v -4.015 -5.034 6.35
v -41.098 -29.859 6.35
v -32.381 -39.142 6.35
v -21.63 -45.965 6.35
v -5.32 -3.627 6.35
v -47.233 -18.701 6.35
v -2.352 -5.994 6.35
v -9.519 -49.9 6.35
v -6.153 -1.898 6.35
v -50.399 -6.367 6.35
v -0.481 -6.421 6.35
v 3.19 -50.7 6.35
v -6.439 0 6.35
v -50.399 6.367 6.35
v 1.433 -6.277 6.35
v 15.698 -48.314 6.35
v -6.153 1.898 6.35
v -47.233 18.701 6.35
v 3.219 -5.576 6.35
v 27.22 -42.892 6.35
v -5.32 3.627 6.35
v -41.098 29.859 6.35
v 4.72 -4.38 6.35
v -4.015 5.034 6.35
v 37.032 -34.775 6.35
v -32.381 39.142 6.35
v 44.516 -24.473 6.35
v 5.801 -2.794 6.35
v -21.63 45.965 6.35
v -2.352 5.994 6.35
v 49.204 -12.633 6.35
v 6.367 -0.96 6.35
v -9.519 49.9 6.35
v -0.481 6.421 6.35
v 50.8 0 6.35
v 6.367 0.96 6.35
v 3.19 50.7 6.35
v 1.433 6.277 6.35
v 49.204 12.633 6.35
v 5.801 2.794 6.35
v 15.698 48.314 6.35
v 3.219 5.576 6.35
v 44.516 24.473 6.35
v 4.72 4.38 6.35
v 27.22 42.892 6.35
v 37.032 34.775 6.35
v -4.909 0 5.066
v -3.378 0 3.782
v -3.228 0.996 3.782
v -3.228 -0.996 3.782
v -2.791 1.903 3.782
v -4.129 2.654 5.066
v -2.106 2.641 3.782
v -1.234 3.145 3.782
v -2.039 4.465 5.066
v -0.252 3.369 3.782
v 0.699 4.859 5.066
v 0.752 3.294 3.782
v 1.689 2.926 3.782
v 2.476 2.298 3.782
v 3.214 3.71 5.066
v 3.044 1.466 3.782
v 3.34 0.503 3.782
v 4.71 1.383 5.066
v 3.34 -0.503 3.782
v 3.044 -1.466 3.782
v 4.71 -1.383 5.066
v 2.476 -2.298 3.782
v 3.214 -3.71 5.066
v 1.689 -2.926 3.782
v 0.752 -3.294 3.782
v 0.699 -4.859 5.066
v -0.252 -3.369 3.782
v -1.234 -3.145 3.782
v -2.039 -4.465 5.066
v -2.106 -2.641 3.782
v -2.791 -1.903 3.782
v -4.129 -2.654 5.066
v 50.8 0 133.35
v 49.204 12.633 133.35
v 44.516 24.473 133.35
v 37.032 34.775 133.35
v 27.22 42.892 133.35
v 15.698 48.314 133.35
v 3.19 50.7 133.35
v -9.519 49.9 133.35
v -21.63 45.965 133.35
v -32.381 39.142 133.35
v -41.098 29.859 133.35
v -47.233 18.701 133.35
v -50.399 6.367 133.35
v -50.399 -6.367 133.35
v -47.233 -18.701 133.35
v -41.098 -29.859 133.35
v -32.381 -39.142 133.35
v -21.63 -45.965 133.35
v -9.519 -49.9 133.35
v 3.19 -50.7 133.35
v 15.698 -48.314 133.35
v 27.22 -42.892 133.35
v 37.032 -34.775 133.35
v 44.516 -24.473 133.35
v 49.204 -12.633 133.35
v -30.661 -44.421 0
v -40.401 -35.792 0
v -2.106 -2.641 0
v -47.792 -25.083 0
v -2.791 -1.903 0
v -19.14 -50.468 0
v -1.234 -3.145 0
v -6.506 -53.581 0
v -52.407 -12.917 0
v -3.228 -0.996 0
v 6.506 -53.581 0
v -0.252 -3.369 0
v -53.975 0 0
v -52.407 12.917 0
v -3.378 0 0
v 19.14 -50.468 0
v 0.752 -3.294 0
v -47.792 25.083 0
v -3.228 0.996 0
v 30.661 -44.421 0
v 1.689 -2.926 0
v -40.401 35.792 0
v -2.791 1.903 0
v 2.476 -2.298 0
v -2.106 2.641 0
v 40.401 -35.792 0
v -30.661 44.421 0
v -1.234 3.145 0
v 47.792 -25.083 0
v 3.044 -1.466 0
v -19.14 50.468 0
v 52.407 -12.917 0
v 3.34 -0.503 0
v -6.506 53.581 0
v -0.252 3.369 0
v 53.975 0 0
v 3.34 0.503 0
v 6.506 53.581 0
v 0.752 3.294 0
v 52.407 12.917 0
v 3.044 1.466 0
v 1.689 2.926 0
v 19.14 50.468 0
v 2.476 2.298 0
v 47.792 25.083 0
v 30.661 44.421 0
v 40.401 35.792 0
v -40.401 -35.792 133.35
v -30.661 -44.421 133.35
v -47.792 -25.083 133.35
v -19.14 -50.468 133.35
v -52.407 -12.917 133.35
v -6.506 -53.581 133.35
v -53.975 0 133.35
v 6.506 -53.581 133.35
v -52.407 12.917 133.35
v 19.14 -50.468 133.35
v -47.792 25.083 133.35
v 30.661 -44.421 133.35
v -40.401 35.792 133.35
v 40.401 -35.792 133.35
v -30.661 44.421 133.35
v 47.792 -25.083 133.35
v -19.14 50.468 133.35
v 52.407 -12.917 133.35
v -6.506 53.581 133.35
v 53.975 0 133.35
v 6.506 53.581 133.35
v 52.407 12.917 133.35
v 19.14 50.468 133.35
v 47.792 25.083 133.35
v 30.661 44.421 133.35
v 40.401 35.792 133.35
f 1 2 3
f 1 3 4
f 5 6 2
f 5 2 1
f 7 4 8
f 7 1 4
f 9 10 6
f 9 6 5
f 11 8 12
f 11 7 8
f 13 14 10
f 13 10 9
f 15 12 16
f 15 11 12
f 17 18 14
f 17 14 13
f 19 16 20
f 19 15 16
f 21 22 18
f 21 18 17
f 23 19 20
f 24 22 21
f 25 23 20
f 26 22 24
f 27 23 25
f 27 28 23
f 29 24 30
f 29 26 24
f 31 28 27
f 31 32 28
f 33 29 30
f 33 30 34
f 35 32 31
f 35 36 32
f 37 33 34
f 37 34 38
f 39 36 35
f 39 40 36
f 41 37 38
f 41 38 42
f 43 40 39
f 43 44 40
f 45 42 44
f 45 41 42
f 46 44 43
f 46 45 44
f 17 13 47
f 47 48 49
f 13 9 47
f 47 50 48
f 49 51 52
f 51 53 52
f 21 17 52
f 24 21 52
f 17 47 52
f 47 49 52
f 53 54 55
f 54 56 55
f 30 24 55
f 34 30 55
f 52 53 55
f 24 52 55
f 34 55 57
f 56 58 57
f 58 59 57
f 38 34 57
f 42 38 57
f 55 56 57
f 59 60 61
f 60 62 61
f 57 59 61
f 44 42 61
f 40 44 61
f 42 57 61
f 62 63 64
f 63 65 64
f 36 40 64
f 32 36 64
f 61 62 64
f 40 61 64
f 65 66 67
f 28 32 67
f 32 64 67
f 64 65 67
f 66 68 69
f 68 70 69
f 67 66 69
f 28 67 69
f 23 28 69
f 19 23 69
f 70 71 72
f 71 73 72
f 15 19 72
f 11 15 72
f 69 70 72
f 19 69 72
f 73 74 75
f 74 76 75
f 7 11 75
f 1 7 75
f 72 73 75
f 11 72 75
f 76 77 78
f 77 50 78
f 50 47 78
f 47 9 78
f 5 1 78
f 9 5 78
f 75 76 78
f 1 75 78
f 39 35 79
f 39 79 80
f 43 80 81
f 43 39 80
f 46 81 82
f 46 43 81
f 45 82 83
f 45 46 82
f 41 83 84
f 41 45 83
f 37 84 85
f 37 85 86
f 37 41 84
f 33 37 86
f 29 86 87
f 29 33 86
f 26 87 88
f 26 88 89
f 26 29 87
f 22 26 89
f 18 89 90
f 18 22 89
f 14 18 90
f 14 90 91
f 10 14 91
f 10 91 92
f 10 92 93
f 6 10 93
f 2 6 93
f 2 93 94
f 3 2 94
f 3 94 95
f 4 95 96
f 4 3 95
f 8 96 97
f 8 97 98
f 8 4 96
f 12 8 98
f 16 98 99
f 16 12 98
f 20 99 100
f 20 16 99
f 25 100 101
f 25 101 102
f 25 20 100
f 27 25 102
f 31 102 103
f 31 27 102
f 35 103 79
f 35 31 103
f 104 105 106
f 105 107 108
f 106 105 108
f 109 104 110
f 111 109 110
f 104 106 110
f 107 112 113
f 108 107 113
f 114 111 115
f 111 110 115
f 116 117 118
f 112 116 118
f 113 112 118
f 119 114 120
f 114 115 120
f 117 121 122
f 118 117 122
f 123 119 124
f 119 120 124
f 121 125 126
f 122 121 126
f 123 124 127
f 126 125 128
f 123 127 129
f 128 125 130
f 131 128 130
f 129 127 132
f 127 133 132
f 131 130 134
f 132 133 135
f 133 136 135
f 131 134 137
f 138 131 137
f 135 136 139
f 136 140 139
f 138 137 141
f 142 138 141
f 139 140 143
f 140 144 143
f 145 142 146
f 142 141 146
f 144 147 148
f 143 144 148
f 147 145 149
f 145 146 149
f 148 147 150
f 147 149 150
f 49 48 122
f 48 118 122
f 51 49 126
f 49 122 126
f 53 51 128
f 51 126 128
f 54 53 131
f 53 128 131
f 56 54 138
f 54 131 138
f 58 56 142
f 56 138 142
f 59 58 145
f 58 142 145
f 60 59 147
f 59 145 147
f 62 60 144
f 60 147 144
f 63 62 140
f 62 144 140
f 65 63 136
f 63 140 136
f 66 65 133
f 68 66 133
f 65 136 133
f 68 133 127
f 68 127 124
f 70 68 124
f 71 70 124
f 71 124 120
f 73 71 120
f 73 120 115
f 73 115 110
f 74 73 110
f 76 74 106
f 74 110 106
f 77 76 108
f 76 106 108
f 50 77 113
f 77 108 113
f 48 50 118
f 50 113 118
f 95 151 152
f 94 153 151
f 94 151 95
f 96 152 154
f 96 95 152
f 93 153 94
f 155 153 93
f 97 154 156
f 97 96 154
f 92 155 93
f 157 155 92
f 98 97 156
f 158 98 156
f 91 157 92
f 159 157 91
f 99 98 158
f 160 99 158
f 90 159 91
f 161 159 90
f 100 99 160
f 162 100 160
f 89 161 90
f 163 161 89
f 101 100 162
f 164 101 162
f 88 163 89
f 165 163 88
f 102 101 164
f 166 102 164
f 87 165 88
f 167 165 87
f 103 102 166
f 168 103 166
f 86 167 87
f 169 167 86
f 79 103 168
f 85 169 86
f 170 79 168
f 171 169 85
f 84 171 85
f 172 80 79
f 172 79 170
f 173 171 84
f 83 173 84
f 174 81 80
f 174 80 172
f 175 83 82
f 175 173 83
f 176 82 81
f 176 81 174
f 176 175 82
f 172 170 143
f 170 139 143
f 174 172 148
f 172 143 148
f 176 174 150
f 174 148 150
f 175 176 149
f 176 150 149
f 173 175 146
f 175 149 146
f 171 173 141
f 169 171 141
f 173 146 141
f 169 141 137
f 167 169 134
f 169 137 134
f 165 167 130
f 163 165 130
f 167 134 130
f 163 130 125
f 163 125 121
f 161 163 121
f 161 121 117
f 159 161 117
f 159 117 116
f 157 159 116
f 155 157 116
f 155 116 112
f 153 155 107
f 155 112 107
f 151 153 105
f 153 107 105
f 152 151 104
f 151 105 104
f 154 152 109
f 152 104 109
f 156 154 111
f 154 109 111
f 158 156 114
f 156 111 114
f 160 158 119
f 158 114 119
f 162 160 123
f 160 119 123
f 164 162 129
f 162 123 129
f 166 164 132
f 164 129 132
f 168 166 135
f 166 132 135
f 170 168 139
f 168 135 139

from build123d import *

# Parameters (mm, degrees)
SKETCH1_R                                           = 53.975
BOSS_EXTRUDE1_DEPTH                                 = 6.35
CSK_FOR_1_4_FLAT_HEAD_MACHINE_SCREW_100_D           = 6.7564
CSK_FOR_1_4_FLAT_HEAD_MACHINE_SCREW_100_CSINK_D     = 12.8778
CSK_FOR_1_4_FLAT_HEAD_MACHINE_SCREW_100_CSINK_ANGLE = 100
SKETCH4_R                                           = 53.975
SKETCH4_R_2                                         = 50.8
BOSS_EXTRUDE2_DEPTH                                 = 127


with BuildPart() as part:
    # Sketch1 → Boss-Extrude1 (new body)
    with BuildSketch(Plane.XY):
        Circle(SKETCH1_R)
    extrude(amount=BOSS_EXTRUDE1_DEPTH)

    # CSK for 1/4 Flat Head Machine Screw (100)1 (through all)
    with Locations(Plane.XY.offset(6.35)):
        with Locations((0, 0)):
            CounterSinkHole(CSK_FOR_1_4_FLAT_HEAD_MACHINE_SCREW_100_D / 2, CSK_FOR_1_4_FLAT_HEAD_MACHINE_SCREW_100_CSINK_D / 2, counter_sink_angle=CSK_FOR_1_4_FLAT_HEAD_MACHINE_SCREW_100_CSINK_ANGLE)

    # Sketch4 → Boss-Extrude2 (add)
    with BuildSketch(Plane.XY.offset(6.35)):
        Circle(SKETCH4_R)
        Circle(SKETCH4_R_2, mode=Mode.SUBTRACT)
    extrude(amount=BOSS_EXTRUDE2_DEPTH)


solid = part.part
